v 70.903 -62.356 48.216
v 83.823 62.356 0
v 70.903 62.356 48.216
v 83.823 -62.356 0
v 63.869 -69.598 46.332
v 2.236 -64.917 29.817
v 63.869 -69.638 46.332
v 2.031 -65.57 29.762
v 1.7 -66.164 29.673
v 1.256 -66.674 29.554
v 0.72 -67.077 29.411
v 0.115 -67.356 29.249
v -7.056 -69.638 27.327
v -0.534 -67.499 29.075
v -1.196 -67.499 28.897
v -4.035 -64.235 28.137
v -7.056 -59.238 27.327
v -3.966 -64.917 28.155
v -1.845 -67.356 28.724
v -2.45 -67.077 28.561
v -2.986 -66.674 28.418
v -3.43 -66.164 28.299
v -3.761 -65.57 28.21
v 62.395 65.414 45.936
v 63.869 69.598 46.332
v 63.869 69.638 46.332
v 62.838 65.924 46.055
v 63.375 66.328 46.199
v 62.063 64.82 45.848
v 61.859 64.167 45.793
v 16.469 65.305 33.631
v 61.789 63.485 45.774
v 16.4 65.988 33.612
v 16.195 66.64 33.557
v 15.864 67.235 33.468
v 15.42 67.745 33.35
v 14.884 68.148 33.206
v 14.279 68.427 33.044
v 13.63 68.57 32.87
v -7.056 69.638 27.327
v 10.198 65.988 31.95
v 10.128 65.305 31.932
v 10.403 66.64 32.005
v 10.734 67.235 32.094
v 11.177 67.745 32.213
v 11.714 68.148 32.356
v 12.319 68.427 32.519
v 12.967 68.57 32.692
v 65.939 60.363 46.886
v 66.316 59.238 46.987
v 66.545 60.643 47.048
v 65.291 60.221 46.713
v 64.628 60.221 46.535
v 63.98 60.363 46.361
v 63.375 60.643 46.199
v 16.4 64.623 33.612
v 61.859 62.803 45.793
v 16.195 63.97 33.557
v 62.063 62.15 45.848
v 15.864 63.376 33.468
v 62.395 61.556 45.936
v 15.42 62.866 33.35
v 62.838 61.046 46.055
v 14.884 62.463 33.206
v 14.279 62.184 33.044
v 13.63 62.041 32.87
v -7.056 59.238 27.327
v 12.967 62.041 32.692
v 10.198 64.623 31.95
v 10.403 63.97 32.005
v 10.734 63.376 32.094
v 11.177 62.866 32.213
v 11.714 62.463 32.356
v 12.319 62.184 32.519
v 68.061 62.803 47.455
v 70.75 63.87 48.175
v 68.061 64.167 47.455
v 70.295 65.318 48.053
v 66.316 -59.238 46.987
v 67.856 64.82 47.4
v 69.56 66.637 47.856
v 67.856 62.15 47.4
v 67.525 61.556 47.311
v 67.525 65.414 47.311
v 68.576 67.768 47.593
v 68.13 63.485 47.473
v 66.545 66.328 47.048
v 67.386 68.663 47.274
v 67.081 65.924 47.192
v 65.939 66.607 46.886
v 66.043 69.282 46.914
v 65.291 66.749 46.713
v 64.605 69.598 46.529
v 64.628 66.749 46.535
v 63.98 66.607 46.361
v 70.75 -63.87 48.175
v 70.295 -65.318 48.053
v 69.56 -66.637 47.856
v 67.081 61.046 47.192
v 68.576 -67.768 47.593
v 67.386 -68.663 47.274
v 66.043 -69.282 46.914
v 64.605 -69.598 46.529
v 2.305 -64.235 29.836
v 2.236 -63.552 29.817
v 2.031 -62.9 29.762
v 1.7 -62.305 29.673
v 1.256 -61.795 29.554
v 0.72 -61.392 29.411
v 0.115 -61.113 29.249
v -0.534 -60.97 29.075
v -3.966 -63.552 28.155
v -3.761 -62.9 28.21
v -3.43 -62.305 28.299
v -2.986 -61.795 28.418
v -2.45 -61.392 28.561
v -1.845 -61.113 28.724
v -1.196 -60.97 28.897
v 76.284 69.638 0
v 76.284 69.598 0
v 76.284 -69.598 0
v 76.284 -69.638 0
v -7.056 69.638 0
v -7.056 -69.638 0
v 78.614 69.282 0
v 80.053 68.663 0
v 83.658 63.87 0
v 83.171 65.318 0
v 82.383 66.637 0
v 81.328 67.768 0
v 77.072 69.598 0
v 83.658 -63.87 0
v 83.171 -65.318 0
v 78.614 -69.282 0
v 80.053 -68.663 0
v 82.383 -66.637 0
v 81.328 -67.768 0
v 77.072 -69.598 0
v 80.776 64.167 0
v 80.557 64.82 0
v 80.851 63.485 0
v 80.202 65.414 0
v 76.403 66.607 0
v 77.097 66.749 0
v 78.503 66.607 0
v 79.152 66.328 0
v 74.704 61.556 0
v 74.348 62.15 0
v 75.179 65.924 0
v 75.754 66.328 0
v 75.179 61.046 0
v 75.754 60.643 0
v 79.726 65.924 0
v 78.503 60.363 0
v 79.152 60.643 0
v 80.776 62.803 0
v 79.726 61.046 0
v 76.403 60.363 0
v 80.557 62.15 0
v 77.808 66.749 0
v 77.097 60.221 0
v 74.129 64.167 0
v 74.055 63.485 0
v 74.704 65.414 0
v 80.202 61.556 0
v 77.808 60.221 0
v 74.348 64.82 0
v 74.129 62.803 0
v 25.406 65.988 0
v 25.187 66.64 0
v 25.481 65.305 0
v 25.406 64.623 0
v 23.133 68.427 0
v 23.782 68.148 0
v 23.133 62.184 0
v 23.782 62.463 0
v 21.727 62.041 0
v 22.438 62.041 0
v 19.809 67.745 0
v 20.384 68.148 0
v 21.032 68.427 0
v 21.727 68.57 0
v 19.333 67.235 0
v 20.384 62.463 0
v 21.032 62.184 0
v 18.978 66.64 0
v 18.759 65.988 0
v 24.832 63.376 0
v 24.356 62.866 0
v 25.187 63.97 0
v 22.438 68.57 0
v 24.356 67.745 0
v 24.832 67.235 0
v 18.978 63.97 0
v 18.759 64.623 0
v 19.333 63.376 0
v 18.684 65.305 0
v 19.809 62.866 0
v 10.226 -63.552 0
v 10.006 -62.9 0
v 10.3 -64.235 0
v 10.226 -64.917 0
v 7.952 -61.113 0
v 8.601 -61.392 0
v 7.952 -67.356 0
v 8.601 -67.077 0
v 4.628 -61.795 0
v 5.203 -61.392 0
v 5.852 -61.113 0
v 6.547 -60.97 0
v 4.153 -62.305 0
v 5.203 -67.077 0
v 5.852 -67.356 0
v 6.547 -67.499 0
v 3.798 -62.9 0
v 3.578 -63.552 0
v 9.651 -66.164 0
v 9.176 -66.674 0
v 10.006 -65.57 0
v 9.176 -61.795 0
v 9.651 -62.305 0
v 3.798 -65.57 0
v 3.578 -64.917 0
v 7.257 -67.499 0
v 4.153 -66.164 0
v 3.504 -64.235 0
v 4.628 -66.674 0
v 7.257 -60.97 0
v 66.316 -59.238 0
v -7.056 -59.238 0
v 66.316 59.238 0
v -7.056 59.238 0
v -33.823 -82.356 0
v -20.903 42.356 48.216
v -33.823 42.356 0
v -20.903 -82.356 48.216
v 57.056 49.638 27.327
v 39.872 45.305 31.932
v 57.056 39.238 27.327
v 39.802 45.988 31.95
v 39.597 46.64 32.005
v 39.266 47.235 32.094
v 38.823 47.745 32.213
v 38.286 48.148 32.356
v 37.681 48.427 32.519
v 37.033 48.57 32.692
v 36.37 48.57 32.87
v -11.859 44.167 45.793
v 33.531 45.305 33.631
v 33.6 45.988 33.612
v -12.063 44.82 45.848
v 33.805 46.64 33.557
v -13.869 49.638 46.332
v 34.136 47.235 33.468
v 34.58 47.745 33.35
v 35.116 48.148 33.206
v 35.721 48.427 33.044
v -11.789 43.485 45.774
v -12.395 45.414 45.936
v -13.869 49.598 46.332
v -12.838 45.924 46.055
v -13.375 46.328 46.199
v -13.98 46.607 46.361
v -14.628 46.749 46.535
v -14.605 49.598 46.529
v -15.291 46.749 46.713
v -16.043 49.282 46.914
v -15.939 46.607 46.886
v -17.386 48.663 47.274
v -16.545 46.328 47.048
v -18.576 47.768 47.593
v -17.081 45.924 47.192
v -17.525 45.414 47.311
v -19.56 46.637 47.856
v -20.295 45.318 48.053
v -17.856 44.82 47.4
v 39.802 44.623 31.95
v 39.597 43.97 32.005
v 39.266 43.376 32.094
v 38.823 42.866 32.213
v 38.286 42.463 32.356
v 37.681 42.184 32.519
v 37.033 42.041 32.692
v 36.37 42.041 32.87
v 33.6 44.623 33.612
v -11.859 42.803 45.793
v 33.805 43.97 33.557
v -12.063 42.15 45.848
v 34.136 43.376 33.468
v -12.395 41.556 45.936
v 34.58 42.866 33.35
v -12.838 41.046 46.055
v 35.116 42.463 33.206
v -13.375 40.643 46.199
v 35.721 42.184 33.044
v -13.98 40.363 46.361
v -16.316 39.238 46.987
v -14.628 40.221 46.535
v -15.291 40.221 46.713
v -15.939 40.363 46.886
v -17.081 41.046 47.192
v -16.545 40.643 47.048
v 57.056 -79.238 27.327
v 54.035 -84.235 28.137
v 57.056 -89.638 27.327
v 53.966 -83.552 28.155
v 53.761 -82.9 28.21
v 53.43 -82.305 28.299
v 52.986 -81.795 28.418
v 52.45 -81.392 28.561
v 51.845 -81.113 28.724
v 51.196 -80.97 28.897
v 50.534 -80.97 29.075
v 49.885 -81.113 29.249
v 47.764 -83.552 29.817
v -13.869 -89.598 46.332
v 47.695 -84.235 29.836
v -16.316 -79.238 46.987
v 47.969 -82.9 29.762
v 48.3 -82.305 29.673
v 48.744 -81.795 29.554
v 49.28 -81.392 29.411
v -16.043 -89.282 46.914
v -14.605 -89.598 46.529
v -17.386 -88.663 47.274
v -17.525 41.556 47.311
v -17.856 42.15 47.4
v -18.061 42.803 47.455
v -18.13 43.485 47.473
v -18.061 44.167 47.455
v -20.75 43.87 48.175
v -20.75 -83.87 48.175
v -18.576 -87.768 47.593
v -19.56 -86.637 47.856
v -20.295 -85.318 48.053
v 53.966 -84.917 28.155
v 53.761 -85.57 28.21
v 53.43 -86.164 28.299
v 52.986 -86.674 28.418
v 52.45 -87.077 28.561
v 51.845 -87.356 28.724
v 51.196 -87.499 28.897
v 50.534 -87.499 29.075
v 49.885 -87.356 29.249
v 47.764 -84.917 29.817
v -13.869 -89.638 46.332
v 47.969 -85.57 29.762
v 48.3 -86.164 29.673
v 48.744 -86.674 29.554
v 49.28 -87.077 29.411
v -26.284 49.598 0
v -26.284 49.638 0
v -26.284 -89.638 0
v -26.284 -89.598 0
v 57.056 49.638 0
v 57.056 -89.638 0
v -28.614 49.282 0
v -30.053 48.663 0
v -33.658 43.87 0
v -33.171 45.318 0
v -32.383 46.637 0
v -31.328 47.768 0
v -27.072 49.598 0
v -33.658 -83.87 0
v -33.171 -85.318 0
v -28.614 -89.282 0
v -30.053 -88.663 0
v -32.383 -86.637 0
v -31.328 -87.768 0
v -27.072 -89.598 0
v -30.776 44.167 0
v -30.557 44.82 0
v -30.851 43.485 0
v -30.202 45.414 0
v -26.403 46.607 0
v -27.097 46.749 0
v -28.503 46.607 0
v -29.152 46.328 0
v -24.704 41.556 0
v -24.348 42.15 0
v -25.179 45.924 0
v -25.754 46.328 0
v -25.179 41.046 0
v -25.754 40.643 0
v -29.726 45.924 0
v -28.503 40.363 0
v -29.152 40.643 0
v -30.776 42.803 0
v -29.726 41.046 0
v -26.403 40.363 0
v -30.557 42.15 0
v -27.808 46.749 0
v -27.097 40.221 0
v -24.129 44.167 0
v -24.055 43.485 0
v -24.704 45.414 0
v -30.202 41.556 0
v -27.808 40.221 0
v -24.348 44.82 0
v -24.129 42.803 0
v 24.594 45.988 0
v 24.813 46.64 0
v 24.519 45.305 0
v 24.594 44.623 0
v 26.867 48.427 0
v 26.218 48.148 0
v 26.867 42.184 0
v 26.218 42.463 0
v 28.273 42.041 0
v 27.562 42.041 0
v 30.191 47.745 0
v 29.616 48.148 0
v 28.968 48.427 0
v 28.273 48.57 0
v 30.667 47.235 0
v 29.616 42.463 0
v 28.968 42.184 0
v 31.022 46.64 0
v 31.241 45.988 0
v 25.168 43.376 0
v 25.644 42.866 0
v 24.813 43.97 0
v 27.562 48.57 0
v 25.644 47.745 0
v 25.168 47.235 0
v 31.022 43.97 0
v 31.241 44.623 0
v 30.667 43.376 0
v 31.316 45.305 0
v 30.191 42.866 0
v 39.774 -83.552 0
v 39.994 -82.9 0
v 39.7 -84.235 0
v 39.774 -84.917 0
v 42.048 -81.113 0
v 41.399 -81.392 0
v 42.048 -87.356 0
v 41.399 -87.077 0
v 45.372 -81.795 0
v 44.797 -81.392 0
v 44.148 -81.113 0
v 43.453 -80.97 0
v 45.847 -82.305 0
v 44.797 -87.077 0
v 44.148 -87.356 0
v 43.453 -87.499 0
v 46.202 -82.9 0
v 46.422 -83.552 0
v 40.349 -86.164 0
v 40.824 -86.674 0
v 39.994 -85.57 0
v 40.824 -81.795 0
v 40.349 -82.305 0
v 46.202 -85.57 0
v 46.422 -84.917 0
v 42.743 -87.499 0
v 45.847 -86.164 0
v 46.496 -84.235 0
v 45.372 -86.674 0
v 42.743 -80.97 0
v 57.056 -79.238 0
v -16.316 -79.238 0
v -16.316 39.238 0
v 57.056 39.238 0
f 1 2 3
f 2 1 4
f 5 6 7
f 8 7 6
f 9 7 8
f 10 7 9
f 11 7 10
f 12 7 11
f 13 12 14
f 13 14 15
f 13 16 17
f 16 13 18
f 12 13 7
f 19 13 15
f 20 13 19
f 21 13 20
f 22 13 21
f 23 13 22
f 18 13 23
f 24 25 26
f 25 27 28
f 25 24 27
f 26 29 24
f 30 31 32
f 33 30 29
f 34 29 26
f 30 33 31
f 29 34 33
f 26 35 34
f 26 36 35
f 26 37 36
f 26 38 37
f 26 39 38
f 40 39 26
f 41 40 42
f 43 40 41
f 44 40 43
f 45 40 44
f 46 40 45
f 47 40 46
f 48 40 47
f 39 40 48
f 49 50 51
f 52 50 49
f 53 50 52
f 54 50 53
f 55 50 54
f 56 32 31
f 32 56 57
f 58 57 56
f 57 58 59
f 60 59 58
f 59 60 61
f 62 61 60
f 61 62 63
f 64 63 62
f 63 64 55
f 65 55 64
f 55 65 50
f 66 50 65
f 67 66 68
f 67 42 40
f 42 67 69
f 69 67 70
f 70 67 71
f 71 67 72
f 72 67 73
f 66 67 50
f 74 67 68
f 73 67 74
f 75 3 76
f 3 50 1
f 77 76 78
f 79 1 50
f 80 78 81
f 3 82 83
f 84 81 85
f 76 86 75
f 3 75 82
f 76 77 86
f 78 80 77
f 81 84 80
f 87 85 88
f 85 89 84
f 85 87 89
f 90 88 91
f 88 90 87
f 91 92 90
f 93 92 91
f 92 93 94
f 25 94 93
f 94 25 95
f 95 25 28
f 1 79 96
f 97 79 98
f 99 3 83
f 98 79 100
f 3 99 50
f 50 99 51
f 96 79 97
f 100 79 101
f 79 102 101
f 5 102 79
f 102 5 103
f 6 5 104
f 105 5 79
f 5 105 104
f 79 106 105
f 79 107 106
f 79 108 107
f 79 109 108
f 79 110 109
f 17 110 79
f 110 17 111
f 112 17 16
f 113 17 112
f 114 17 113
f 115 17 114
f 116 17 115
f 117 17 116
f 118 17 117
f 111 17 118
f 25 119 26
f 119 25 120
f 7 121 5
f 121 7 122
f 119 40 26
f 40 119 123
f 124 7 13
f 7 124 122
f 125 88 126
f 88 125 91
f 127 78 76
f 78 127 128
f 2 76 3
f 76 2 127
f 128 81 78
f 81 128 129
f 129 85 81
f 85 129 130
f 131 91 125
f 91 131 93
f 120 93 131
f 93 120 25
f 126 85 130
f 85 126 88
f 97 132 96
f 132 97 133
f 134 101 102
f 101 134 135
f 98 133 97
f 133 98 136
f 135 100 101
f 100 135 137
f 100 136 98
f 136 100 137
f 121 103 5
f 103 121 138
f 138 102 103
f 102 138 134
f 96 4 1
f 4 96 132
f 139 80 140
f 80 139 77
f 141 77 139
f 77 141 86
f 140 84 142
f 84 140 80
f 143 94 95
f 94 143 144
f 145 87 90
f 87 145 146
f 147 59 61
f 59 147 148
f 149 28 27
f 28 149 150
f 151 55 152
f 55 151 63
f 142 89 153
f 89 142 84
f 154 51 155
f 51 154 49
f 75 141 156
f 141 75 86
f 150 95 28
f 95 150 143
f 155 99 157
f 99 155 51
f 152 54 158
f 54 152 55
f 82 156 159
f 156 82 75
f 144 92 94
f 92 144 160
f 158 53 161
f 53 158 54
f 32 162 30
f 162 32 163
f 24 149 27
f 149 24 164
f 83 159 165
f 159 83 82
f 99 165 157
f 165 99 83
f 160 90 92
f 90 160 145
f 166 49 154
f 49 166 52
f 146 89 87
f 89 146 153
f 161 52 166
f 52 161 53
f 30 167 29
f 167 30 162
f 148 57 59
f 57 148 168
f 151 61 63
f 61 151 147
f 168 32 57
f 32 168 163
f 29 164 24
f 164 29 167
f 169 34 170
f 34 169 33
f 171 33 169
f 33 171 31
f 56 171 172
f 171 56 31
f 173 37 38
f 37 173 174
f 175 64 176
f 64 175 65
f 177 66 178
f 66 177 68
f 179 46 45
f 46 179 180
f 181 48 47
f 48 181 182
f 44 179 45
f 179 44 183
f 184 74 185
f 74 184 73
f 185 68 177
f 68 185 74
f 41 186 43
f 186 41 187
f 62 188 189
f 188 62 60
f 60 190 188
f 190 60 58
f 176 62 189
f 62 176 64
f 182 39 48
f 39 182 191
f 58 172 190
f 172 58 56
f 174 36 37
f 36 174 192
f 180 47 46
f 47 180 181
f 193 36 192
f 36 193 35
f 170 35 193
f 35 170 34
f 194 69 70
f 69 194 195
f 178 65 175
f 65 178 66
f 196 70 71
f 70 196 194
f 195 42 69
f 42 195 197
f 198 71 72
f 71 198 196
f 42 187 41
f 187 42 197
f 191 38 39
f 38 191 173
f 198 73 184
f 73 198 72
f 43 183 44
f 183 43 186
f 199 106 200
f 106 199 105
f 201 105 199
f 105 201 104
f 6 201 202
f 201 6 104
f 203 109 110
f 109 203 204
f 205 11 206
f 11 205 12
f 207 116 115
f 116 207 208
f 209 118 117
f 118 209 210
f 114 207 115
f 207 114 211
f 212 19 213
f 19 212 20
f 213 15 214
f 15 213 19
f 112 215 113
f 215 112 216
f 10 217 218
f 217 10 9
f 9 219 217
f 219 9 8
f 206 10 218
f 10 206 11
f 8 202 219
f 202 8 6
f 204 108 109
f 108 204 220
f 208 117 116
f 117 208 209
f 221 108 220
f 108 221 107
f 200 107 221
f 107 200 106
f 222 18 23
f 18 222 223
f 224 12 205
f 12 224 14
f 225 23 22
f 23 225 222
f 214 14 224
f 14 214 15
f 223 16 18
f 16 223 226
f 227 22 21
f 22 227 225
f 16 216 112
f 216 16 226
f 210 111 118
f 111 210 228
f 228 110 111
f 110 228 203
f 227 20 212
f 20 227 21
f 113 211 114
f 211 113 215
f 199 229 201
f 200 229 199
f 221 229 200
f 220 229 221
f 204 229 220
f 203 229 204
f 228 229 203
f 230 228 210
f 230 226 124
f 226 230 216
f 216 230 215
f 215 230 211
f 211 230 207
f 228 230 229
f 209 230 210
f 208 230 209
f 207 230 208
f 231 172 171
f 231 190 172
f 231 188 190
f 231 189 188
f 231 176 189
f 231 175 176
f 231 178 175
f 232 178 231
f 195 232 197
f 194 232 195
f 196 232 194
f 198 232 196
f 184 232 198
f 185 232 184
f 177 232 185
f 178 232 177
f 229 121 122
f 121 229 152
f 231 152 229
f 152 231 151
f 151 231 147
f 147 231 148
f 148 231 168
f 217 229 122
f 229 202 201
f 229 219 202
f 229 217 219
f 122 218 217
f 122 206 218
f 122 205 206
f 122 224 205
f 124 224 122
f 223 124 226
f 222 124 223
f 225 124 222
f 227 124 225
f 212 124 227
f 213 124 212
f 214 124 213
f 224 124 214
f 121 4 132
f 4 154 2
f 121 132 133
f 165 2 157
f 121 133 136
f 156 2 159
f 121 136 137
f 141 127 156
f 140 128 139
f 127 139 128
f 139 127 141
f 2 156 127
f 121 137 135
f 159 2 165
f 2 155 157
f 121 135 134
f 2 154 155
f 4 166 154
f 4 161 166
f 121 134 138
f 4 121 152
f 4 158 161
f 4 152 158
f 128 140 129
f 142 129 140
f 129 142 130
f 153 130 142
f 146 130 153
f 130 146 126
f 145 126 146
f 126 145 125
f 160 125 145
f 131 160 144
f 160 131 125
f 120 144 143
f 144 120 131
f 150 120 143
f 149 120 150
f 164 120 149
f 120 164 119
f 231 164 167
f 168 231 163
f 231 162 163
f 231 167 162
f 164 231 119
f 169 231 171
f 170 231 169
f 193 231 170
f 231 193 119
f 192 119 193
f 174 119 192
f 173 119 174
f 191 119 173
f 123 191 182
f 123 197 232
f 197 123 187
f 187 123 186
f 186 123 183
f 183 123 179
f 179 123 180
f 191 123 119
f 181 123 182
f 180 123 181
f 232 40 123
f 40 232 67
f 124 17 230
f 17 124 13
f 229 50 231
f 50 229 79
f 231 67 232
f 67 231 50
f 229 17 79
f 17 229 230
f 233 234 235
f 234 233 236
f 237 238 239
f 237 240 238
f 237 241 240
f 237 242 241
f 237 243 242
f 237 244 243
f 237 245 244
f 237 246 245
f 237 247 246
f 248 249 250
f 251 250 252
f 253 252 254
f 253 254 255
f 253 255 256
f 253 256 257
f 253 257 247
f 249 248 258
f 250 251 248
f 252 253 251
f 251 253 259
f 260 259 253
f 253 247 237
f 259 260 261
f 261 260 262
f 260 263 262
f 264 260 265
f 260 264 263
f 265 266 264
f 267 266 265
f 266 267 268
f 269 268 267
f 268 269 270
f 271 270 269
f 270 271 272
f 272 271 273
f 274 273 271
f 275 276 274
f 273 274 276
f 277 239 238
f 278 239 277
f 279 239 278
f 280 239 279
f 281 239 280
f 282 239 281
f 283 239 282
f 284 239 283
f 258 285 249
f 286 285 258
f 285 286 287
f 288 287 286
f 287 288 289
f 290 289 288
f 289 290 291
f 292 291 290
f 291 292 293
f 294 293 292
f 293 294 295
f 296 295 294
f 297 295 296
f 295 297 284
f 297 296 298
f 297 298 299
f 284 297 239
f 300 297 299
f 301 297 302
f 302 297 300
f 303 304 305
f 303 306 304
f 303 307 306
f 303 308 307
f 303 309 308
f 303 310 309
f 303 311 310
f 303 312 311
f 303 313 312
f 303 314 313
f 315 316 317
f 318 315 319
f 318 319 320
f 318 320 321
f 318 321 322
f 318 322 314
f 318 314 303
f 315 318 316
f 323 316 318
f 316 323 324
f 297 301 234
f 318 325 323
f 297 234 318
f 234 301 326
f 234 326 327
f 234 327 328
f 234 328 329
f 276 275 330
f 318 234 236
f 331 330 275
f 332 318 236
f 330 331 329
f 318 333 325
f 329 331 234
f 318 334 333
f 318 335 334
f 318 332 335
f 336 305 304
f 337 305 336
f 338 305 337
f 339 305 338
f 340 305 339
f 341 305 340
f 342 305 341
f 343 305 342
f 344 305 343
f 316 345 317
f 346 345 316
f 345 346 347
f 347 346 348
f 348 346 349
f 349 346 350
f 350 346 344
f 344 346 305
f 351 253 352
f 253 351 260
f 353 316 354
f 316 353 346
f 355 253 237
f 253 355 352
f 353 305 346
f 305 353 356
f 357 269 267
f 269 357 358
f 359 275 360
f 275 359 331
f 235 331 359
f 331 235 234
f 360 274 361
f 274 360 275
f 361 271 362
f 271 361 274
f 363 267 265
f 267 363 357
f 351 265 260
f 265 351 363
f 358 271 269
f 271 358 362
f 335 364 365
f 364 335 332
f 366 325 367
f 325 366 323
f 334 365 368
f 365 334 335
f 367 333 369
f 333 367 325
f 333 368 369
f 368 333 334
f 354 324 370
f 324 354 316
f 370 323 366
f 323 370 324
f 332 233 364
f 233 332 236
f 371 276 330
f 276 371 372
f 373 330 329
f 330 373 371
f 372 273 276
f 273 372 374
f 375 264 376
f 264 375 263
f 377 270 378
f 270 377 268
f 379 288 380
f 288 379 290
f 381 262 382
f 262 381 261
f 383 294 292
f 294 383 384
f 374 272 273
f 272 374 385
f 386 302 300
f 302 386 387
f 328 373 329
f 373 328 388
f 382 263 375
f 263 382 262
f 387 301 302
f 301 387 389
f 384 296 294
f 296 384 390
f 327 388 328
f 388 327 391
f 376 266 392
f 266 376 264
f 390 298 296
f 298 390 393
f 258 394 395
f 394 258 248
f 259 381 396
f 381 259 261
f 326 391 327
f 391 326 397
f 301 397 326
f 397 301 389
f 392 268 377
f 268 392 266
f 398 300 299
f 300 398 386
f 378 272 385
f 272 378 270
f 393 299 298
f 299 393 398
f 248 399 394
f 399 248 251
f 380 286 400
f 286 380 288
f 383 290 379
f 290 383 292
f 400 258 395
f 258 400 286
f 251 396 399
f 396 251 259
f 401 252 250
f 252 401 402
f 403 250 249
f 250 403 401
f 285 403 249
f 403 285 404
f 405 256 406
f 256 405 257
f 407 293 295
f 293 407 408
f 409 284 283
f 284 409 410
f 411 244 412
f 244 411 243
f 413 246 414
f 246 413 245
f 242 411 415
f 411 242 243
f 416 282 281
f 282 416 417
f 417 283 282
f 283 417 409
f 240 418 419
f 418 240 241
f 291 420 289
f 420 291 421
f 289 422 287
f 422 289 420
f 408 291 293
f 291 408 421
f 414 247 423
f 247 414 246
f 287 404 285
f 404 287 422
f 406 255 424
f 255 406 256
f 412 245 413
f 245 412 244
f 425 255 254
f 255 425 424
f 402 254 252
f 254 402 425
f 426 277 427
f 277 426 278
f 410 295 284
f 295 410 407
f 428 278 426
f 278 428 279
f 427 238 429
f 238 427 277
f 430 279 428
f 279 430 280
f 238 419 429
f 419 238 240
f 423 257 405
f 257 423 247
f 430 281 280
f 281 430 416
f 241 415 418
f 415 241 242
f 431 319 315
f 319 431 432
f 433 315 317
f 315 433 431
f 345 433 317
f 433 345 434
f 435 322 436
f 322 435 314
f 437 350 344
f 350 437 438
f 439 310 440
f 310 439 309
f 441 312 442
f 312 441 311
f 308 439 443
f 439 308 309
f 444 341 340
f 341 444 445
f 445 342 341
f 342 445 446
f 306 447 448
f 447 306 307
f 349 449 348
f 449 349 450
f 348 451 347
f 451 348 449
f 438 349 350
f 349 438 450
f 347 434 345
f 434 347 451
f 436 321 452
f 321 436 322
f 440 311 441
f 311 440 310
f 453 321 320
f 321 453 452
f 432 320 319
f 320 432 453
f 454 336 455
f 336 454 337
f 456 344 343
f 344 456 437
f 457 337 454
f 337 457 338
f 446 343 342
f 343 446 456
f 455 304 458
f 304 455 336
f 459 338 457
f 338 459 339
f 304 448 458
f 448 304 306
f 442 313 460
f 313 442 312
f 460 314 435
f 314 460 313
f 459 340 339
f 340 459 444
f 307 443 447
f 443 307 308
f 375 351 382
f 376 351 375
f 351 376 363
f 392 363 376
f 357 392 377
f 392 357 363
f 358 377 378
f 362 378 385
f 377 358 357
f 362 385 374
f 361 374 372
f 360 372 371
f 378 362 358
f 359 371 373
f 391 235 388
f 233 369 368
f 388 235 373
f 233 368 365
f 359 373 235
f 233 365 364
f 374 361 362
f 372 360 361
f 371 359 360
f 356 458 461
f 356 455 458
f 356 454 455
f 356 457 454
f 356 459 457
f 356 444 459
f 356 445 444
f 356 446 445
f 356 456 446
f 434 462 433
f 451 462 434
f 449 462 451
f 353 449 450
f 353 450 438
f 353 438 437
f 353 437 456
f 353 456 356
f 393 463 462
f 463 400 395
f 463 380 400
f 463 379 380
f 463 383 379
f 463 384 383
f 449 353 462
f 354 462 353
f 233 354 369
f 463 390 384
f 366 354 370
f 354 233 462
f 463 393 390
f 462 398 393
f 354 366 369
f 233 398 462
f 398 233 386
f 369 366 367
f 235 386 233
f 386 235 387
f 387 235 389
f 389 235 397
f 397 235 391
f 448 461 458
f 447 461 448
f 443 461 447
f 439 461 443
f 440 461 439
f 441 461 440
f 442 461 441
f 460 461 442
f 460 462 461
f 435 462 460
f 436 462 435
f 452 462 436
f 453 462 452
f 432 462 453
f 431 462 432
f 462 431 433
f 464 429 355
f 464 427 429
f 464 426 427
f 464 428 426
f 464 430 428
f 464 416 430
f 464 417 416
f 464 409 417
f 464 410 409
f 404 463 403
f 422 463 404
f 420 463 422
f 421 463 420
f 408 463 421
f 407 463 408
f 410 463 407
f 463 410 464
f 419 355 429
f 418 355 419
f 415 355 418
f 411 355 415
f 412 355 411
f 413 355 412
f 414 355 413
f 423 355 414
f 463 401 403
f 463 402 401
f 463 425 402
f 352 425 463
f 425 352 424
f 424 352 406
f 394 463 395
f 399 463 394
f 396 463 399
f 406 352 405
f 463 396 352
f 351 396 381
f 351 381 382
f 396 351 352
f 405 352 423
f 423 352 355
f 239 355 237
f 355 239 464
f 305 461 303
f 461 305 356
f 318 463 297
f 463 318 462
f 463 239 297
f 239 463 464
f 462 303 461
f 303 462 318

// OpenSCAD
rect_depth = 441.894;
rect_width = 522.174;
rect_height = 100;

curve_radius = 25.803;

total_width = rect_width + 2*curve_radius;
total_depth = rect_depth + 2*curve_radius;

slope = PI/12 * 180/PI;
echo(slope);
screw_radius = 11.63/2;
nut_radius = 11.63;
module nut_hole() {
    cylinder(r=nut_radius, h=5*rect_height, center=true);
}

module main_base() {
    difference() {
        translate([0, 0, rect_height/2]) {
            union() {
                cube([total_width, rect_depth, rect_height], center=true);
                cube([rect_width, total_depth, rect_height], center=true);
                translate([rect_width/2, rect_depth/2, 0]) cylinder(r=curve_radius, h=rect_height, center=true);
                translate([rect_width/-2, rect_depth/2, 0]) cylinder(r=curve_radius, h=rect_height, center=true);
                translate([rect_width/-2, rect_depth/-2, 0]) cylinder(r=curve_radius, h=rect_height, center=true);
                translate([rect_width/2, rect_depth/-2, 0]) cylinder(r=curve_radius, h=rect_height, center=true);
            }
        }
        translate([rect_width/2 + 4, rect_depth/2 + 4, 0]) nut_hole();
        translate([rect_width/2 + 4 - 189.508, rect_depth/2 + 4 + 6.45, 0]) nut_hole();
        translate([rect_width/2 + 4 - 241.465, rect_depth/2 + 4 - 452.55, 0]) nut_hole();
    }
}
//main_base();

shift_down_height = (rect_height - (total_width/2 * tan(slope))) * cos(slope);

module flush_top() {
    translate([0, 0, -shift_down_height*0]) rotate([0, -slope, 0]) {
        union() {
            main_base();
            translate([0, 0, -100]) main_base();
        }
    }
}
//flush_top();

module tent() {
    scale(25.4/90) difference() {
        flush_top();
        translate([0, 0, -250]) cube([700, 700, 500], center=true);
        translate([-375, 0, -0]) cube([700, 700, 500], center=true);
        translate([0, 0, 100]) cube([0.9*rect_width, 0.95*rect_depth, 300], center=true);
    }
}

union() {
    tent();
    translate([50, -20, 0]) mirror([1, 0, 0]) tent();
}
